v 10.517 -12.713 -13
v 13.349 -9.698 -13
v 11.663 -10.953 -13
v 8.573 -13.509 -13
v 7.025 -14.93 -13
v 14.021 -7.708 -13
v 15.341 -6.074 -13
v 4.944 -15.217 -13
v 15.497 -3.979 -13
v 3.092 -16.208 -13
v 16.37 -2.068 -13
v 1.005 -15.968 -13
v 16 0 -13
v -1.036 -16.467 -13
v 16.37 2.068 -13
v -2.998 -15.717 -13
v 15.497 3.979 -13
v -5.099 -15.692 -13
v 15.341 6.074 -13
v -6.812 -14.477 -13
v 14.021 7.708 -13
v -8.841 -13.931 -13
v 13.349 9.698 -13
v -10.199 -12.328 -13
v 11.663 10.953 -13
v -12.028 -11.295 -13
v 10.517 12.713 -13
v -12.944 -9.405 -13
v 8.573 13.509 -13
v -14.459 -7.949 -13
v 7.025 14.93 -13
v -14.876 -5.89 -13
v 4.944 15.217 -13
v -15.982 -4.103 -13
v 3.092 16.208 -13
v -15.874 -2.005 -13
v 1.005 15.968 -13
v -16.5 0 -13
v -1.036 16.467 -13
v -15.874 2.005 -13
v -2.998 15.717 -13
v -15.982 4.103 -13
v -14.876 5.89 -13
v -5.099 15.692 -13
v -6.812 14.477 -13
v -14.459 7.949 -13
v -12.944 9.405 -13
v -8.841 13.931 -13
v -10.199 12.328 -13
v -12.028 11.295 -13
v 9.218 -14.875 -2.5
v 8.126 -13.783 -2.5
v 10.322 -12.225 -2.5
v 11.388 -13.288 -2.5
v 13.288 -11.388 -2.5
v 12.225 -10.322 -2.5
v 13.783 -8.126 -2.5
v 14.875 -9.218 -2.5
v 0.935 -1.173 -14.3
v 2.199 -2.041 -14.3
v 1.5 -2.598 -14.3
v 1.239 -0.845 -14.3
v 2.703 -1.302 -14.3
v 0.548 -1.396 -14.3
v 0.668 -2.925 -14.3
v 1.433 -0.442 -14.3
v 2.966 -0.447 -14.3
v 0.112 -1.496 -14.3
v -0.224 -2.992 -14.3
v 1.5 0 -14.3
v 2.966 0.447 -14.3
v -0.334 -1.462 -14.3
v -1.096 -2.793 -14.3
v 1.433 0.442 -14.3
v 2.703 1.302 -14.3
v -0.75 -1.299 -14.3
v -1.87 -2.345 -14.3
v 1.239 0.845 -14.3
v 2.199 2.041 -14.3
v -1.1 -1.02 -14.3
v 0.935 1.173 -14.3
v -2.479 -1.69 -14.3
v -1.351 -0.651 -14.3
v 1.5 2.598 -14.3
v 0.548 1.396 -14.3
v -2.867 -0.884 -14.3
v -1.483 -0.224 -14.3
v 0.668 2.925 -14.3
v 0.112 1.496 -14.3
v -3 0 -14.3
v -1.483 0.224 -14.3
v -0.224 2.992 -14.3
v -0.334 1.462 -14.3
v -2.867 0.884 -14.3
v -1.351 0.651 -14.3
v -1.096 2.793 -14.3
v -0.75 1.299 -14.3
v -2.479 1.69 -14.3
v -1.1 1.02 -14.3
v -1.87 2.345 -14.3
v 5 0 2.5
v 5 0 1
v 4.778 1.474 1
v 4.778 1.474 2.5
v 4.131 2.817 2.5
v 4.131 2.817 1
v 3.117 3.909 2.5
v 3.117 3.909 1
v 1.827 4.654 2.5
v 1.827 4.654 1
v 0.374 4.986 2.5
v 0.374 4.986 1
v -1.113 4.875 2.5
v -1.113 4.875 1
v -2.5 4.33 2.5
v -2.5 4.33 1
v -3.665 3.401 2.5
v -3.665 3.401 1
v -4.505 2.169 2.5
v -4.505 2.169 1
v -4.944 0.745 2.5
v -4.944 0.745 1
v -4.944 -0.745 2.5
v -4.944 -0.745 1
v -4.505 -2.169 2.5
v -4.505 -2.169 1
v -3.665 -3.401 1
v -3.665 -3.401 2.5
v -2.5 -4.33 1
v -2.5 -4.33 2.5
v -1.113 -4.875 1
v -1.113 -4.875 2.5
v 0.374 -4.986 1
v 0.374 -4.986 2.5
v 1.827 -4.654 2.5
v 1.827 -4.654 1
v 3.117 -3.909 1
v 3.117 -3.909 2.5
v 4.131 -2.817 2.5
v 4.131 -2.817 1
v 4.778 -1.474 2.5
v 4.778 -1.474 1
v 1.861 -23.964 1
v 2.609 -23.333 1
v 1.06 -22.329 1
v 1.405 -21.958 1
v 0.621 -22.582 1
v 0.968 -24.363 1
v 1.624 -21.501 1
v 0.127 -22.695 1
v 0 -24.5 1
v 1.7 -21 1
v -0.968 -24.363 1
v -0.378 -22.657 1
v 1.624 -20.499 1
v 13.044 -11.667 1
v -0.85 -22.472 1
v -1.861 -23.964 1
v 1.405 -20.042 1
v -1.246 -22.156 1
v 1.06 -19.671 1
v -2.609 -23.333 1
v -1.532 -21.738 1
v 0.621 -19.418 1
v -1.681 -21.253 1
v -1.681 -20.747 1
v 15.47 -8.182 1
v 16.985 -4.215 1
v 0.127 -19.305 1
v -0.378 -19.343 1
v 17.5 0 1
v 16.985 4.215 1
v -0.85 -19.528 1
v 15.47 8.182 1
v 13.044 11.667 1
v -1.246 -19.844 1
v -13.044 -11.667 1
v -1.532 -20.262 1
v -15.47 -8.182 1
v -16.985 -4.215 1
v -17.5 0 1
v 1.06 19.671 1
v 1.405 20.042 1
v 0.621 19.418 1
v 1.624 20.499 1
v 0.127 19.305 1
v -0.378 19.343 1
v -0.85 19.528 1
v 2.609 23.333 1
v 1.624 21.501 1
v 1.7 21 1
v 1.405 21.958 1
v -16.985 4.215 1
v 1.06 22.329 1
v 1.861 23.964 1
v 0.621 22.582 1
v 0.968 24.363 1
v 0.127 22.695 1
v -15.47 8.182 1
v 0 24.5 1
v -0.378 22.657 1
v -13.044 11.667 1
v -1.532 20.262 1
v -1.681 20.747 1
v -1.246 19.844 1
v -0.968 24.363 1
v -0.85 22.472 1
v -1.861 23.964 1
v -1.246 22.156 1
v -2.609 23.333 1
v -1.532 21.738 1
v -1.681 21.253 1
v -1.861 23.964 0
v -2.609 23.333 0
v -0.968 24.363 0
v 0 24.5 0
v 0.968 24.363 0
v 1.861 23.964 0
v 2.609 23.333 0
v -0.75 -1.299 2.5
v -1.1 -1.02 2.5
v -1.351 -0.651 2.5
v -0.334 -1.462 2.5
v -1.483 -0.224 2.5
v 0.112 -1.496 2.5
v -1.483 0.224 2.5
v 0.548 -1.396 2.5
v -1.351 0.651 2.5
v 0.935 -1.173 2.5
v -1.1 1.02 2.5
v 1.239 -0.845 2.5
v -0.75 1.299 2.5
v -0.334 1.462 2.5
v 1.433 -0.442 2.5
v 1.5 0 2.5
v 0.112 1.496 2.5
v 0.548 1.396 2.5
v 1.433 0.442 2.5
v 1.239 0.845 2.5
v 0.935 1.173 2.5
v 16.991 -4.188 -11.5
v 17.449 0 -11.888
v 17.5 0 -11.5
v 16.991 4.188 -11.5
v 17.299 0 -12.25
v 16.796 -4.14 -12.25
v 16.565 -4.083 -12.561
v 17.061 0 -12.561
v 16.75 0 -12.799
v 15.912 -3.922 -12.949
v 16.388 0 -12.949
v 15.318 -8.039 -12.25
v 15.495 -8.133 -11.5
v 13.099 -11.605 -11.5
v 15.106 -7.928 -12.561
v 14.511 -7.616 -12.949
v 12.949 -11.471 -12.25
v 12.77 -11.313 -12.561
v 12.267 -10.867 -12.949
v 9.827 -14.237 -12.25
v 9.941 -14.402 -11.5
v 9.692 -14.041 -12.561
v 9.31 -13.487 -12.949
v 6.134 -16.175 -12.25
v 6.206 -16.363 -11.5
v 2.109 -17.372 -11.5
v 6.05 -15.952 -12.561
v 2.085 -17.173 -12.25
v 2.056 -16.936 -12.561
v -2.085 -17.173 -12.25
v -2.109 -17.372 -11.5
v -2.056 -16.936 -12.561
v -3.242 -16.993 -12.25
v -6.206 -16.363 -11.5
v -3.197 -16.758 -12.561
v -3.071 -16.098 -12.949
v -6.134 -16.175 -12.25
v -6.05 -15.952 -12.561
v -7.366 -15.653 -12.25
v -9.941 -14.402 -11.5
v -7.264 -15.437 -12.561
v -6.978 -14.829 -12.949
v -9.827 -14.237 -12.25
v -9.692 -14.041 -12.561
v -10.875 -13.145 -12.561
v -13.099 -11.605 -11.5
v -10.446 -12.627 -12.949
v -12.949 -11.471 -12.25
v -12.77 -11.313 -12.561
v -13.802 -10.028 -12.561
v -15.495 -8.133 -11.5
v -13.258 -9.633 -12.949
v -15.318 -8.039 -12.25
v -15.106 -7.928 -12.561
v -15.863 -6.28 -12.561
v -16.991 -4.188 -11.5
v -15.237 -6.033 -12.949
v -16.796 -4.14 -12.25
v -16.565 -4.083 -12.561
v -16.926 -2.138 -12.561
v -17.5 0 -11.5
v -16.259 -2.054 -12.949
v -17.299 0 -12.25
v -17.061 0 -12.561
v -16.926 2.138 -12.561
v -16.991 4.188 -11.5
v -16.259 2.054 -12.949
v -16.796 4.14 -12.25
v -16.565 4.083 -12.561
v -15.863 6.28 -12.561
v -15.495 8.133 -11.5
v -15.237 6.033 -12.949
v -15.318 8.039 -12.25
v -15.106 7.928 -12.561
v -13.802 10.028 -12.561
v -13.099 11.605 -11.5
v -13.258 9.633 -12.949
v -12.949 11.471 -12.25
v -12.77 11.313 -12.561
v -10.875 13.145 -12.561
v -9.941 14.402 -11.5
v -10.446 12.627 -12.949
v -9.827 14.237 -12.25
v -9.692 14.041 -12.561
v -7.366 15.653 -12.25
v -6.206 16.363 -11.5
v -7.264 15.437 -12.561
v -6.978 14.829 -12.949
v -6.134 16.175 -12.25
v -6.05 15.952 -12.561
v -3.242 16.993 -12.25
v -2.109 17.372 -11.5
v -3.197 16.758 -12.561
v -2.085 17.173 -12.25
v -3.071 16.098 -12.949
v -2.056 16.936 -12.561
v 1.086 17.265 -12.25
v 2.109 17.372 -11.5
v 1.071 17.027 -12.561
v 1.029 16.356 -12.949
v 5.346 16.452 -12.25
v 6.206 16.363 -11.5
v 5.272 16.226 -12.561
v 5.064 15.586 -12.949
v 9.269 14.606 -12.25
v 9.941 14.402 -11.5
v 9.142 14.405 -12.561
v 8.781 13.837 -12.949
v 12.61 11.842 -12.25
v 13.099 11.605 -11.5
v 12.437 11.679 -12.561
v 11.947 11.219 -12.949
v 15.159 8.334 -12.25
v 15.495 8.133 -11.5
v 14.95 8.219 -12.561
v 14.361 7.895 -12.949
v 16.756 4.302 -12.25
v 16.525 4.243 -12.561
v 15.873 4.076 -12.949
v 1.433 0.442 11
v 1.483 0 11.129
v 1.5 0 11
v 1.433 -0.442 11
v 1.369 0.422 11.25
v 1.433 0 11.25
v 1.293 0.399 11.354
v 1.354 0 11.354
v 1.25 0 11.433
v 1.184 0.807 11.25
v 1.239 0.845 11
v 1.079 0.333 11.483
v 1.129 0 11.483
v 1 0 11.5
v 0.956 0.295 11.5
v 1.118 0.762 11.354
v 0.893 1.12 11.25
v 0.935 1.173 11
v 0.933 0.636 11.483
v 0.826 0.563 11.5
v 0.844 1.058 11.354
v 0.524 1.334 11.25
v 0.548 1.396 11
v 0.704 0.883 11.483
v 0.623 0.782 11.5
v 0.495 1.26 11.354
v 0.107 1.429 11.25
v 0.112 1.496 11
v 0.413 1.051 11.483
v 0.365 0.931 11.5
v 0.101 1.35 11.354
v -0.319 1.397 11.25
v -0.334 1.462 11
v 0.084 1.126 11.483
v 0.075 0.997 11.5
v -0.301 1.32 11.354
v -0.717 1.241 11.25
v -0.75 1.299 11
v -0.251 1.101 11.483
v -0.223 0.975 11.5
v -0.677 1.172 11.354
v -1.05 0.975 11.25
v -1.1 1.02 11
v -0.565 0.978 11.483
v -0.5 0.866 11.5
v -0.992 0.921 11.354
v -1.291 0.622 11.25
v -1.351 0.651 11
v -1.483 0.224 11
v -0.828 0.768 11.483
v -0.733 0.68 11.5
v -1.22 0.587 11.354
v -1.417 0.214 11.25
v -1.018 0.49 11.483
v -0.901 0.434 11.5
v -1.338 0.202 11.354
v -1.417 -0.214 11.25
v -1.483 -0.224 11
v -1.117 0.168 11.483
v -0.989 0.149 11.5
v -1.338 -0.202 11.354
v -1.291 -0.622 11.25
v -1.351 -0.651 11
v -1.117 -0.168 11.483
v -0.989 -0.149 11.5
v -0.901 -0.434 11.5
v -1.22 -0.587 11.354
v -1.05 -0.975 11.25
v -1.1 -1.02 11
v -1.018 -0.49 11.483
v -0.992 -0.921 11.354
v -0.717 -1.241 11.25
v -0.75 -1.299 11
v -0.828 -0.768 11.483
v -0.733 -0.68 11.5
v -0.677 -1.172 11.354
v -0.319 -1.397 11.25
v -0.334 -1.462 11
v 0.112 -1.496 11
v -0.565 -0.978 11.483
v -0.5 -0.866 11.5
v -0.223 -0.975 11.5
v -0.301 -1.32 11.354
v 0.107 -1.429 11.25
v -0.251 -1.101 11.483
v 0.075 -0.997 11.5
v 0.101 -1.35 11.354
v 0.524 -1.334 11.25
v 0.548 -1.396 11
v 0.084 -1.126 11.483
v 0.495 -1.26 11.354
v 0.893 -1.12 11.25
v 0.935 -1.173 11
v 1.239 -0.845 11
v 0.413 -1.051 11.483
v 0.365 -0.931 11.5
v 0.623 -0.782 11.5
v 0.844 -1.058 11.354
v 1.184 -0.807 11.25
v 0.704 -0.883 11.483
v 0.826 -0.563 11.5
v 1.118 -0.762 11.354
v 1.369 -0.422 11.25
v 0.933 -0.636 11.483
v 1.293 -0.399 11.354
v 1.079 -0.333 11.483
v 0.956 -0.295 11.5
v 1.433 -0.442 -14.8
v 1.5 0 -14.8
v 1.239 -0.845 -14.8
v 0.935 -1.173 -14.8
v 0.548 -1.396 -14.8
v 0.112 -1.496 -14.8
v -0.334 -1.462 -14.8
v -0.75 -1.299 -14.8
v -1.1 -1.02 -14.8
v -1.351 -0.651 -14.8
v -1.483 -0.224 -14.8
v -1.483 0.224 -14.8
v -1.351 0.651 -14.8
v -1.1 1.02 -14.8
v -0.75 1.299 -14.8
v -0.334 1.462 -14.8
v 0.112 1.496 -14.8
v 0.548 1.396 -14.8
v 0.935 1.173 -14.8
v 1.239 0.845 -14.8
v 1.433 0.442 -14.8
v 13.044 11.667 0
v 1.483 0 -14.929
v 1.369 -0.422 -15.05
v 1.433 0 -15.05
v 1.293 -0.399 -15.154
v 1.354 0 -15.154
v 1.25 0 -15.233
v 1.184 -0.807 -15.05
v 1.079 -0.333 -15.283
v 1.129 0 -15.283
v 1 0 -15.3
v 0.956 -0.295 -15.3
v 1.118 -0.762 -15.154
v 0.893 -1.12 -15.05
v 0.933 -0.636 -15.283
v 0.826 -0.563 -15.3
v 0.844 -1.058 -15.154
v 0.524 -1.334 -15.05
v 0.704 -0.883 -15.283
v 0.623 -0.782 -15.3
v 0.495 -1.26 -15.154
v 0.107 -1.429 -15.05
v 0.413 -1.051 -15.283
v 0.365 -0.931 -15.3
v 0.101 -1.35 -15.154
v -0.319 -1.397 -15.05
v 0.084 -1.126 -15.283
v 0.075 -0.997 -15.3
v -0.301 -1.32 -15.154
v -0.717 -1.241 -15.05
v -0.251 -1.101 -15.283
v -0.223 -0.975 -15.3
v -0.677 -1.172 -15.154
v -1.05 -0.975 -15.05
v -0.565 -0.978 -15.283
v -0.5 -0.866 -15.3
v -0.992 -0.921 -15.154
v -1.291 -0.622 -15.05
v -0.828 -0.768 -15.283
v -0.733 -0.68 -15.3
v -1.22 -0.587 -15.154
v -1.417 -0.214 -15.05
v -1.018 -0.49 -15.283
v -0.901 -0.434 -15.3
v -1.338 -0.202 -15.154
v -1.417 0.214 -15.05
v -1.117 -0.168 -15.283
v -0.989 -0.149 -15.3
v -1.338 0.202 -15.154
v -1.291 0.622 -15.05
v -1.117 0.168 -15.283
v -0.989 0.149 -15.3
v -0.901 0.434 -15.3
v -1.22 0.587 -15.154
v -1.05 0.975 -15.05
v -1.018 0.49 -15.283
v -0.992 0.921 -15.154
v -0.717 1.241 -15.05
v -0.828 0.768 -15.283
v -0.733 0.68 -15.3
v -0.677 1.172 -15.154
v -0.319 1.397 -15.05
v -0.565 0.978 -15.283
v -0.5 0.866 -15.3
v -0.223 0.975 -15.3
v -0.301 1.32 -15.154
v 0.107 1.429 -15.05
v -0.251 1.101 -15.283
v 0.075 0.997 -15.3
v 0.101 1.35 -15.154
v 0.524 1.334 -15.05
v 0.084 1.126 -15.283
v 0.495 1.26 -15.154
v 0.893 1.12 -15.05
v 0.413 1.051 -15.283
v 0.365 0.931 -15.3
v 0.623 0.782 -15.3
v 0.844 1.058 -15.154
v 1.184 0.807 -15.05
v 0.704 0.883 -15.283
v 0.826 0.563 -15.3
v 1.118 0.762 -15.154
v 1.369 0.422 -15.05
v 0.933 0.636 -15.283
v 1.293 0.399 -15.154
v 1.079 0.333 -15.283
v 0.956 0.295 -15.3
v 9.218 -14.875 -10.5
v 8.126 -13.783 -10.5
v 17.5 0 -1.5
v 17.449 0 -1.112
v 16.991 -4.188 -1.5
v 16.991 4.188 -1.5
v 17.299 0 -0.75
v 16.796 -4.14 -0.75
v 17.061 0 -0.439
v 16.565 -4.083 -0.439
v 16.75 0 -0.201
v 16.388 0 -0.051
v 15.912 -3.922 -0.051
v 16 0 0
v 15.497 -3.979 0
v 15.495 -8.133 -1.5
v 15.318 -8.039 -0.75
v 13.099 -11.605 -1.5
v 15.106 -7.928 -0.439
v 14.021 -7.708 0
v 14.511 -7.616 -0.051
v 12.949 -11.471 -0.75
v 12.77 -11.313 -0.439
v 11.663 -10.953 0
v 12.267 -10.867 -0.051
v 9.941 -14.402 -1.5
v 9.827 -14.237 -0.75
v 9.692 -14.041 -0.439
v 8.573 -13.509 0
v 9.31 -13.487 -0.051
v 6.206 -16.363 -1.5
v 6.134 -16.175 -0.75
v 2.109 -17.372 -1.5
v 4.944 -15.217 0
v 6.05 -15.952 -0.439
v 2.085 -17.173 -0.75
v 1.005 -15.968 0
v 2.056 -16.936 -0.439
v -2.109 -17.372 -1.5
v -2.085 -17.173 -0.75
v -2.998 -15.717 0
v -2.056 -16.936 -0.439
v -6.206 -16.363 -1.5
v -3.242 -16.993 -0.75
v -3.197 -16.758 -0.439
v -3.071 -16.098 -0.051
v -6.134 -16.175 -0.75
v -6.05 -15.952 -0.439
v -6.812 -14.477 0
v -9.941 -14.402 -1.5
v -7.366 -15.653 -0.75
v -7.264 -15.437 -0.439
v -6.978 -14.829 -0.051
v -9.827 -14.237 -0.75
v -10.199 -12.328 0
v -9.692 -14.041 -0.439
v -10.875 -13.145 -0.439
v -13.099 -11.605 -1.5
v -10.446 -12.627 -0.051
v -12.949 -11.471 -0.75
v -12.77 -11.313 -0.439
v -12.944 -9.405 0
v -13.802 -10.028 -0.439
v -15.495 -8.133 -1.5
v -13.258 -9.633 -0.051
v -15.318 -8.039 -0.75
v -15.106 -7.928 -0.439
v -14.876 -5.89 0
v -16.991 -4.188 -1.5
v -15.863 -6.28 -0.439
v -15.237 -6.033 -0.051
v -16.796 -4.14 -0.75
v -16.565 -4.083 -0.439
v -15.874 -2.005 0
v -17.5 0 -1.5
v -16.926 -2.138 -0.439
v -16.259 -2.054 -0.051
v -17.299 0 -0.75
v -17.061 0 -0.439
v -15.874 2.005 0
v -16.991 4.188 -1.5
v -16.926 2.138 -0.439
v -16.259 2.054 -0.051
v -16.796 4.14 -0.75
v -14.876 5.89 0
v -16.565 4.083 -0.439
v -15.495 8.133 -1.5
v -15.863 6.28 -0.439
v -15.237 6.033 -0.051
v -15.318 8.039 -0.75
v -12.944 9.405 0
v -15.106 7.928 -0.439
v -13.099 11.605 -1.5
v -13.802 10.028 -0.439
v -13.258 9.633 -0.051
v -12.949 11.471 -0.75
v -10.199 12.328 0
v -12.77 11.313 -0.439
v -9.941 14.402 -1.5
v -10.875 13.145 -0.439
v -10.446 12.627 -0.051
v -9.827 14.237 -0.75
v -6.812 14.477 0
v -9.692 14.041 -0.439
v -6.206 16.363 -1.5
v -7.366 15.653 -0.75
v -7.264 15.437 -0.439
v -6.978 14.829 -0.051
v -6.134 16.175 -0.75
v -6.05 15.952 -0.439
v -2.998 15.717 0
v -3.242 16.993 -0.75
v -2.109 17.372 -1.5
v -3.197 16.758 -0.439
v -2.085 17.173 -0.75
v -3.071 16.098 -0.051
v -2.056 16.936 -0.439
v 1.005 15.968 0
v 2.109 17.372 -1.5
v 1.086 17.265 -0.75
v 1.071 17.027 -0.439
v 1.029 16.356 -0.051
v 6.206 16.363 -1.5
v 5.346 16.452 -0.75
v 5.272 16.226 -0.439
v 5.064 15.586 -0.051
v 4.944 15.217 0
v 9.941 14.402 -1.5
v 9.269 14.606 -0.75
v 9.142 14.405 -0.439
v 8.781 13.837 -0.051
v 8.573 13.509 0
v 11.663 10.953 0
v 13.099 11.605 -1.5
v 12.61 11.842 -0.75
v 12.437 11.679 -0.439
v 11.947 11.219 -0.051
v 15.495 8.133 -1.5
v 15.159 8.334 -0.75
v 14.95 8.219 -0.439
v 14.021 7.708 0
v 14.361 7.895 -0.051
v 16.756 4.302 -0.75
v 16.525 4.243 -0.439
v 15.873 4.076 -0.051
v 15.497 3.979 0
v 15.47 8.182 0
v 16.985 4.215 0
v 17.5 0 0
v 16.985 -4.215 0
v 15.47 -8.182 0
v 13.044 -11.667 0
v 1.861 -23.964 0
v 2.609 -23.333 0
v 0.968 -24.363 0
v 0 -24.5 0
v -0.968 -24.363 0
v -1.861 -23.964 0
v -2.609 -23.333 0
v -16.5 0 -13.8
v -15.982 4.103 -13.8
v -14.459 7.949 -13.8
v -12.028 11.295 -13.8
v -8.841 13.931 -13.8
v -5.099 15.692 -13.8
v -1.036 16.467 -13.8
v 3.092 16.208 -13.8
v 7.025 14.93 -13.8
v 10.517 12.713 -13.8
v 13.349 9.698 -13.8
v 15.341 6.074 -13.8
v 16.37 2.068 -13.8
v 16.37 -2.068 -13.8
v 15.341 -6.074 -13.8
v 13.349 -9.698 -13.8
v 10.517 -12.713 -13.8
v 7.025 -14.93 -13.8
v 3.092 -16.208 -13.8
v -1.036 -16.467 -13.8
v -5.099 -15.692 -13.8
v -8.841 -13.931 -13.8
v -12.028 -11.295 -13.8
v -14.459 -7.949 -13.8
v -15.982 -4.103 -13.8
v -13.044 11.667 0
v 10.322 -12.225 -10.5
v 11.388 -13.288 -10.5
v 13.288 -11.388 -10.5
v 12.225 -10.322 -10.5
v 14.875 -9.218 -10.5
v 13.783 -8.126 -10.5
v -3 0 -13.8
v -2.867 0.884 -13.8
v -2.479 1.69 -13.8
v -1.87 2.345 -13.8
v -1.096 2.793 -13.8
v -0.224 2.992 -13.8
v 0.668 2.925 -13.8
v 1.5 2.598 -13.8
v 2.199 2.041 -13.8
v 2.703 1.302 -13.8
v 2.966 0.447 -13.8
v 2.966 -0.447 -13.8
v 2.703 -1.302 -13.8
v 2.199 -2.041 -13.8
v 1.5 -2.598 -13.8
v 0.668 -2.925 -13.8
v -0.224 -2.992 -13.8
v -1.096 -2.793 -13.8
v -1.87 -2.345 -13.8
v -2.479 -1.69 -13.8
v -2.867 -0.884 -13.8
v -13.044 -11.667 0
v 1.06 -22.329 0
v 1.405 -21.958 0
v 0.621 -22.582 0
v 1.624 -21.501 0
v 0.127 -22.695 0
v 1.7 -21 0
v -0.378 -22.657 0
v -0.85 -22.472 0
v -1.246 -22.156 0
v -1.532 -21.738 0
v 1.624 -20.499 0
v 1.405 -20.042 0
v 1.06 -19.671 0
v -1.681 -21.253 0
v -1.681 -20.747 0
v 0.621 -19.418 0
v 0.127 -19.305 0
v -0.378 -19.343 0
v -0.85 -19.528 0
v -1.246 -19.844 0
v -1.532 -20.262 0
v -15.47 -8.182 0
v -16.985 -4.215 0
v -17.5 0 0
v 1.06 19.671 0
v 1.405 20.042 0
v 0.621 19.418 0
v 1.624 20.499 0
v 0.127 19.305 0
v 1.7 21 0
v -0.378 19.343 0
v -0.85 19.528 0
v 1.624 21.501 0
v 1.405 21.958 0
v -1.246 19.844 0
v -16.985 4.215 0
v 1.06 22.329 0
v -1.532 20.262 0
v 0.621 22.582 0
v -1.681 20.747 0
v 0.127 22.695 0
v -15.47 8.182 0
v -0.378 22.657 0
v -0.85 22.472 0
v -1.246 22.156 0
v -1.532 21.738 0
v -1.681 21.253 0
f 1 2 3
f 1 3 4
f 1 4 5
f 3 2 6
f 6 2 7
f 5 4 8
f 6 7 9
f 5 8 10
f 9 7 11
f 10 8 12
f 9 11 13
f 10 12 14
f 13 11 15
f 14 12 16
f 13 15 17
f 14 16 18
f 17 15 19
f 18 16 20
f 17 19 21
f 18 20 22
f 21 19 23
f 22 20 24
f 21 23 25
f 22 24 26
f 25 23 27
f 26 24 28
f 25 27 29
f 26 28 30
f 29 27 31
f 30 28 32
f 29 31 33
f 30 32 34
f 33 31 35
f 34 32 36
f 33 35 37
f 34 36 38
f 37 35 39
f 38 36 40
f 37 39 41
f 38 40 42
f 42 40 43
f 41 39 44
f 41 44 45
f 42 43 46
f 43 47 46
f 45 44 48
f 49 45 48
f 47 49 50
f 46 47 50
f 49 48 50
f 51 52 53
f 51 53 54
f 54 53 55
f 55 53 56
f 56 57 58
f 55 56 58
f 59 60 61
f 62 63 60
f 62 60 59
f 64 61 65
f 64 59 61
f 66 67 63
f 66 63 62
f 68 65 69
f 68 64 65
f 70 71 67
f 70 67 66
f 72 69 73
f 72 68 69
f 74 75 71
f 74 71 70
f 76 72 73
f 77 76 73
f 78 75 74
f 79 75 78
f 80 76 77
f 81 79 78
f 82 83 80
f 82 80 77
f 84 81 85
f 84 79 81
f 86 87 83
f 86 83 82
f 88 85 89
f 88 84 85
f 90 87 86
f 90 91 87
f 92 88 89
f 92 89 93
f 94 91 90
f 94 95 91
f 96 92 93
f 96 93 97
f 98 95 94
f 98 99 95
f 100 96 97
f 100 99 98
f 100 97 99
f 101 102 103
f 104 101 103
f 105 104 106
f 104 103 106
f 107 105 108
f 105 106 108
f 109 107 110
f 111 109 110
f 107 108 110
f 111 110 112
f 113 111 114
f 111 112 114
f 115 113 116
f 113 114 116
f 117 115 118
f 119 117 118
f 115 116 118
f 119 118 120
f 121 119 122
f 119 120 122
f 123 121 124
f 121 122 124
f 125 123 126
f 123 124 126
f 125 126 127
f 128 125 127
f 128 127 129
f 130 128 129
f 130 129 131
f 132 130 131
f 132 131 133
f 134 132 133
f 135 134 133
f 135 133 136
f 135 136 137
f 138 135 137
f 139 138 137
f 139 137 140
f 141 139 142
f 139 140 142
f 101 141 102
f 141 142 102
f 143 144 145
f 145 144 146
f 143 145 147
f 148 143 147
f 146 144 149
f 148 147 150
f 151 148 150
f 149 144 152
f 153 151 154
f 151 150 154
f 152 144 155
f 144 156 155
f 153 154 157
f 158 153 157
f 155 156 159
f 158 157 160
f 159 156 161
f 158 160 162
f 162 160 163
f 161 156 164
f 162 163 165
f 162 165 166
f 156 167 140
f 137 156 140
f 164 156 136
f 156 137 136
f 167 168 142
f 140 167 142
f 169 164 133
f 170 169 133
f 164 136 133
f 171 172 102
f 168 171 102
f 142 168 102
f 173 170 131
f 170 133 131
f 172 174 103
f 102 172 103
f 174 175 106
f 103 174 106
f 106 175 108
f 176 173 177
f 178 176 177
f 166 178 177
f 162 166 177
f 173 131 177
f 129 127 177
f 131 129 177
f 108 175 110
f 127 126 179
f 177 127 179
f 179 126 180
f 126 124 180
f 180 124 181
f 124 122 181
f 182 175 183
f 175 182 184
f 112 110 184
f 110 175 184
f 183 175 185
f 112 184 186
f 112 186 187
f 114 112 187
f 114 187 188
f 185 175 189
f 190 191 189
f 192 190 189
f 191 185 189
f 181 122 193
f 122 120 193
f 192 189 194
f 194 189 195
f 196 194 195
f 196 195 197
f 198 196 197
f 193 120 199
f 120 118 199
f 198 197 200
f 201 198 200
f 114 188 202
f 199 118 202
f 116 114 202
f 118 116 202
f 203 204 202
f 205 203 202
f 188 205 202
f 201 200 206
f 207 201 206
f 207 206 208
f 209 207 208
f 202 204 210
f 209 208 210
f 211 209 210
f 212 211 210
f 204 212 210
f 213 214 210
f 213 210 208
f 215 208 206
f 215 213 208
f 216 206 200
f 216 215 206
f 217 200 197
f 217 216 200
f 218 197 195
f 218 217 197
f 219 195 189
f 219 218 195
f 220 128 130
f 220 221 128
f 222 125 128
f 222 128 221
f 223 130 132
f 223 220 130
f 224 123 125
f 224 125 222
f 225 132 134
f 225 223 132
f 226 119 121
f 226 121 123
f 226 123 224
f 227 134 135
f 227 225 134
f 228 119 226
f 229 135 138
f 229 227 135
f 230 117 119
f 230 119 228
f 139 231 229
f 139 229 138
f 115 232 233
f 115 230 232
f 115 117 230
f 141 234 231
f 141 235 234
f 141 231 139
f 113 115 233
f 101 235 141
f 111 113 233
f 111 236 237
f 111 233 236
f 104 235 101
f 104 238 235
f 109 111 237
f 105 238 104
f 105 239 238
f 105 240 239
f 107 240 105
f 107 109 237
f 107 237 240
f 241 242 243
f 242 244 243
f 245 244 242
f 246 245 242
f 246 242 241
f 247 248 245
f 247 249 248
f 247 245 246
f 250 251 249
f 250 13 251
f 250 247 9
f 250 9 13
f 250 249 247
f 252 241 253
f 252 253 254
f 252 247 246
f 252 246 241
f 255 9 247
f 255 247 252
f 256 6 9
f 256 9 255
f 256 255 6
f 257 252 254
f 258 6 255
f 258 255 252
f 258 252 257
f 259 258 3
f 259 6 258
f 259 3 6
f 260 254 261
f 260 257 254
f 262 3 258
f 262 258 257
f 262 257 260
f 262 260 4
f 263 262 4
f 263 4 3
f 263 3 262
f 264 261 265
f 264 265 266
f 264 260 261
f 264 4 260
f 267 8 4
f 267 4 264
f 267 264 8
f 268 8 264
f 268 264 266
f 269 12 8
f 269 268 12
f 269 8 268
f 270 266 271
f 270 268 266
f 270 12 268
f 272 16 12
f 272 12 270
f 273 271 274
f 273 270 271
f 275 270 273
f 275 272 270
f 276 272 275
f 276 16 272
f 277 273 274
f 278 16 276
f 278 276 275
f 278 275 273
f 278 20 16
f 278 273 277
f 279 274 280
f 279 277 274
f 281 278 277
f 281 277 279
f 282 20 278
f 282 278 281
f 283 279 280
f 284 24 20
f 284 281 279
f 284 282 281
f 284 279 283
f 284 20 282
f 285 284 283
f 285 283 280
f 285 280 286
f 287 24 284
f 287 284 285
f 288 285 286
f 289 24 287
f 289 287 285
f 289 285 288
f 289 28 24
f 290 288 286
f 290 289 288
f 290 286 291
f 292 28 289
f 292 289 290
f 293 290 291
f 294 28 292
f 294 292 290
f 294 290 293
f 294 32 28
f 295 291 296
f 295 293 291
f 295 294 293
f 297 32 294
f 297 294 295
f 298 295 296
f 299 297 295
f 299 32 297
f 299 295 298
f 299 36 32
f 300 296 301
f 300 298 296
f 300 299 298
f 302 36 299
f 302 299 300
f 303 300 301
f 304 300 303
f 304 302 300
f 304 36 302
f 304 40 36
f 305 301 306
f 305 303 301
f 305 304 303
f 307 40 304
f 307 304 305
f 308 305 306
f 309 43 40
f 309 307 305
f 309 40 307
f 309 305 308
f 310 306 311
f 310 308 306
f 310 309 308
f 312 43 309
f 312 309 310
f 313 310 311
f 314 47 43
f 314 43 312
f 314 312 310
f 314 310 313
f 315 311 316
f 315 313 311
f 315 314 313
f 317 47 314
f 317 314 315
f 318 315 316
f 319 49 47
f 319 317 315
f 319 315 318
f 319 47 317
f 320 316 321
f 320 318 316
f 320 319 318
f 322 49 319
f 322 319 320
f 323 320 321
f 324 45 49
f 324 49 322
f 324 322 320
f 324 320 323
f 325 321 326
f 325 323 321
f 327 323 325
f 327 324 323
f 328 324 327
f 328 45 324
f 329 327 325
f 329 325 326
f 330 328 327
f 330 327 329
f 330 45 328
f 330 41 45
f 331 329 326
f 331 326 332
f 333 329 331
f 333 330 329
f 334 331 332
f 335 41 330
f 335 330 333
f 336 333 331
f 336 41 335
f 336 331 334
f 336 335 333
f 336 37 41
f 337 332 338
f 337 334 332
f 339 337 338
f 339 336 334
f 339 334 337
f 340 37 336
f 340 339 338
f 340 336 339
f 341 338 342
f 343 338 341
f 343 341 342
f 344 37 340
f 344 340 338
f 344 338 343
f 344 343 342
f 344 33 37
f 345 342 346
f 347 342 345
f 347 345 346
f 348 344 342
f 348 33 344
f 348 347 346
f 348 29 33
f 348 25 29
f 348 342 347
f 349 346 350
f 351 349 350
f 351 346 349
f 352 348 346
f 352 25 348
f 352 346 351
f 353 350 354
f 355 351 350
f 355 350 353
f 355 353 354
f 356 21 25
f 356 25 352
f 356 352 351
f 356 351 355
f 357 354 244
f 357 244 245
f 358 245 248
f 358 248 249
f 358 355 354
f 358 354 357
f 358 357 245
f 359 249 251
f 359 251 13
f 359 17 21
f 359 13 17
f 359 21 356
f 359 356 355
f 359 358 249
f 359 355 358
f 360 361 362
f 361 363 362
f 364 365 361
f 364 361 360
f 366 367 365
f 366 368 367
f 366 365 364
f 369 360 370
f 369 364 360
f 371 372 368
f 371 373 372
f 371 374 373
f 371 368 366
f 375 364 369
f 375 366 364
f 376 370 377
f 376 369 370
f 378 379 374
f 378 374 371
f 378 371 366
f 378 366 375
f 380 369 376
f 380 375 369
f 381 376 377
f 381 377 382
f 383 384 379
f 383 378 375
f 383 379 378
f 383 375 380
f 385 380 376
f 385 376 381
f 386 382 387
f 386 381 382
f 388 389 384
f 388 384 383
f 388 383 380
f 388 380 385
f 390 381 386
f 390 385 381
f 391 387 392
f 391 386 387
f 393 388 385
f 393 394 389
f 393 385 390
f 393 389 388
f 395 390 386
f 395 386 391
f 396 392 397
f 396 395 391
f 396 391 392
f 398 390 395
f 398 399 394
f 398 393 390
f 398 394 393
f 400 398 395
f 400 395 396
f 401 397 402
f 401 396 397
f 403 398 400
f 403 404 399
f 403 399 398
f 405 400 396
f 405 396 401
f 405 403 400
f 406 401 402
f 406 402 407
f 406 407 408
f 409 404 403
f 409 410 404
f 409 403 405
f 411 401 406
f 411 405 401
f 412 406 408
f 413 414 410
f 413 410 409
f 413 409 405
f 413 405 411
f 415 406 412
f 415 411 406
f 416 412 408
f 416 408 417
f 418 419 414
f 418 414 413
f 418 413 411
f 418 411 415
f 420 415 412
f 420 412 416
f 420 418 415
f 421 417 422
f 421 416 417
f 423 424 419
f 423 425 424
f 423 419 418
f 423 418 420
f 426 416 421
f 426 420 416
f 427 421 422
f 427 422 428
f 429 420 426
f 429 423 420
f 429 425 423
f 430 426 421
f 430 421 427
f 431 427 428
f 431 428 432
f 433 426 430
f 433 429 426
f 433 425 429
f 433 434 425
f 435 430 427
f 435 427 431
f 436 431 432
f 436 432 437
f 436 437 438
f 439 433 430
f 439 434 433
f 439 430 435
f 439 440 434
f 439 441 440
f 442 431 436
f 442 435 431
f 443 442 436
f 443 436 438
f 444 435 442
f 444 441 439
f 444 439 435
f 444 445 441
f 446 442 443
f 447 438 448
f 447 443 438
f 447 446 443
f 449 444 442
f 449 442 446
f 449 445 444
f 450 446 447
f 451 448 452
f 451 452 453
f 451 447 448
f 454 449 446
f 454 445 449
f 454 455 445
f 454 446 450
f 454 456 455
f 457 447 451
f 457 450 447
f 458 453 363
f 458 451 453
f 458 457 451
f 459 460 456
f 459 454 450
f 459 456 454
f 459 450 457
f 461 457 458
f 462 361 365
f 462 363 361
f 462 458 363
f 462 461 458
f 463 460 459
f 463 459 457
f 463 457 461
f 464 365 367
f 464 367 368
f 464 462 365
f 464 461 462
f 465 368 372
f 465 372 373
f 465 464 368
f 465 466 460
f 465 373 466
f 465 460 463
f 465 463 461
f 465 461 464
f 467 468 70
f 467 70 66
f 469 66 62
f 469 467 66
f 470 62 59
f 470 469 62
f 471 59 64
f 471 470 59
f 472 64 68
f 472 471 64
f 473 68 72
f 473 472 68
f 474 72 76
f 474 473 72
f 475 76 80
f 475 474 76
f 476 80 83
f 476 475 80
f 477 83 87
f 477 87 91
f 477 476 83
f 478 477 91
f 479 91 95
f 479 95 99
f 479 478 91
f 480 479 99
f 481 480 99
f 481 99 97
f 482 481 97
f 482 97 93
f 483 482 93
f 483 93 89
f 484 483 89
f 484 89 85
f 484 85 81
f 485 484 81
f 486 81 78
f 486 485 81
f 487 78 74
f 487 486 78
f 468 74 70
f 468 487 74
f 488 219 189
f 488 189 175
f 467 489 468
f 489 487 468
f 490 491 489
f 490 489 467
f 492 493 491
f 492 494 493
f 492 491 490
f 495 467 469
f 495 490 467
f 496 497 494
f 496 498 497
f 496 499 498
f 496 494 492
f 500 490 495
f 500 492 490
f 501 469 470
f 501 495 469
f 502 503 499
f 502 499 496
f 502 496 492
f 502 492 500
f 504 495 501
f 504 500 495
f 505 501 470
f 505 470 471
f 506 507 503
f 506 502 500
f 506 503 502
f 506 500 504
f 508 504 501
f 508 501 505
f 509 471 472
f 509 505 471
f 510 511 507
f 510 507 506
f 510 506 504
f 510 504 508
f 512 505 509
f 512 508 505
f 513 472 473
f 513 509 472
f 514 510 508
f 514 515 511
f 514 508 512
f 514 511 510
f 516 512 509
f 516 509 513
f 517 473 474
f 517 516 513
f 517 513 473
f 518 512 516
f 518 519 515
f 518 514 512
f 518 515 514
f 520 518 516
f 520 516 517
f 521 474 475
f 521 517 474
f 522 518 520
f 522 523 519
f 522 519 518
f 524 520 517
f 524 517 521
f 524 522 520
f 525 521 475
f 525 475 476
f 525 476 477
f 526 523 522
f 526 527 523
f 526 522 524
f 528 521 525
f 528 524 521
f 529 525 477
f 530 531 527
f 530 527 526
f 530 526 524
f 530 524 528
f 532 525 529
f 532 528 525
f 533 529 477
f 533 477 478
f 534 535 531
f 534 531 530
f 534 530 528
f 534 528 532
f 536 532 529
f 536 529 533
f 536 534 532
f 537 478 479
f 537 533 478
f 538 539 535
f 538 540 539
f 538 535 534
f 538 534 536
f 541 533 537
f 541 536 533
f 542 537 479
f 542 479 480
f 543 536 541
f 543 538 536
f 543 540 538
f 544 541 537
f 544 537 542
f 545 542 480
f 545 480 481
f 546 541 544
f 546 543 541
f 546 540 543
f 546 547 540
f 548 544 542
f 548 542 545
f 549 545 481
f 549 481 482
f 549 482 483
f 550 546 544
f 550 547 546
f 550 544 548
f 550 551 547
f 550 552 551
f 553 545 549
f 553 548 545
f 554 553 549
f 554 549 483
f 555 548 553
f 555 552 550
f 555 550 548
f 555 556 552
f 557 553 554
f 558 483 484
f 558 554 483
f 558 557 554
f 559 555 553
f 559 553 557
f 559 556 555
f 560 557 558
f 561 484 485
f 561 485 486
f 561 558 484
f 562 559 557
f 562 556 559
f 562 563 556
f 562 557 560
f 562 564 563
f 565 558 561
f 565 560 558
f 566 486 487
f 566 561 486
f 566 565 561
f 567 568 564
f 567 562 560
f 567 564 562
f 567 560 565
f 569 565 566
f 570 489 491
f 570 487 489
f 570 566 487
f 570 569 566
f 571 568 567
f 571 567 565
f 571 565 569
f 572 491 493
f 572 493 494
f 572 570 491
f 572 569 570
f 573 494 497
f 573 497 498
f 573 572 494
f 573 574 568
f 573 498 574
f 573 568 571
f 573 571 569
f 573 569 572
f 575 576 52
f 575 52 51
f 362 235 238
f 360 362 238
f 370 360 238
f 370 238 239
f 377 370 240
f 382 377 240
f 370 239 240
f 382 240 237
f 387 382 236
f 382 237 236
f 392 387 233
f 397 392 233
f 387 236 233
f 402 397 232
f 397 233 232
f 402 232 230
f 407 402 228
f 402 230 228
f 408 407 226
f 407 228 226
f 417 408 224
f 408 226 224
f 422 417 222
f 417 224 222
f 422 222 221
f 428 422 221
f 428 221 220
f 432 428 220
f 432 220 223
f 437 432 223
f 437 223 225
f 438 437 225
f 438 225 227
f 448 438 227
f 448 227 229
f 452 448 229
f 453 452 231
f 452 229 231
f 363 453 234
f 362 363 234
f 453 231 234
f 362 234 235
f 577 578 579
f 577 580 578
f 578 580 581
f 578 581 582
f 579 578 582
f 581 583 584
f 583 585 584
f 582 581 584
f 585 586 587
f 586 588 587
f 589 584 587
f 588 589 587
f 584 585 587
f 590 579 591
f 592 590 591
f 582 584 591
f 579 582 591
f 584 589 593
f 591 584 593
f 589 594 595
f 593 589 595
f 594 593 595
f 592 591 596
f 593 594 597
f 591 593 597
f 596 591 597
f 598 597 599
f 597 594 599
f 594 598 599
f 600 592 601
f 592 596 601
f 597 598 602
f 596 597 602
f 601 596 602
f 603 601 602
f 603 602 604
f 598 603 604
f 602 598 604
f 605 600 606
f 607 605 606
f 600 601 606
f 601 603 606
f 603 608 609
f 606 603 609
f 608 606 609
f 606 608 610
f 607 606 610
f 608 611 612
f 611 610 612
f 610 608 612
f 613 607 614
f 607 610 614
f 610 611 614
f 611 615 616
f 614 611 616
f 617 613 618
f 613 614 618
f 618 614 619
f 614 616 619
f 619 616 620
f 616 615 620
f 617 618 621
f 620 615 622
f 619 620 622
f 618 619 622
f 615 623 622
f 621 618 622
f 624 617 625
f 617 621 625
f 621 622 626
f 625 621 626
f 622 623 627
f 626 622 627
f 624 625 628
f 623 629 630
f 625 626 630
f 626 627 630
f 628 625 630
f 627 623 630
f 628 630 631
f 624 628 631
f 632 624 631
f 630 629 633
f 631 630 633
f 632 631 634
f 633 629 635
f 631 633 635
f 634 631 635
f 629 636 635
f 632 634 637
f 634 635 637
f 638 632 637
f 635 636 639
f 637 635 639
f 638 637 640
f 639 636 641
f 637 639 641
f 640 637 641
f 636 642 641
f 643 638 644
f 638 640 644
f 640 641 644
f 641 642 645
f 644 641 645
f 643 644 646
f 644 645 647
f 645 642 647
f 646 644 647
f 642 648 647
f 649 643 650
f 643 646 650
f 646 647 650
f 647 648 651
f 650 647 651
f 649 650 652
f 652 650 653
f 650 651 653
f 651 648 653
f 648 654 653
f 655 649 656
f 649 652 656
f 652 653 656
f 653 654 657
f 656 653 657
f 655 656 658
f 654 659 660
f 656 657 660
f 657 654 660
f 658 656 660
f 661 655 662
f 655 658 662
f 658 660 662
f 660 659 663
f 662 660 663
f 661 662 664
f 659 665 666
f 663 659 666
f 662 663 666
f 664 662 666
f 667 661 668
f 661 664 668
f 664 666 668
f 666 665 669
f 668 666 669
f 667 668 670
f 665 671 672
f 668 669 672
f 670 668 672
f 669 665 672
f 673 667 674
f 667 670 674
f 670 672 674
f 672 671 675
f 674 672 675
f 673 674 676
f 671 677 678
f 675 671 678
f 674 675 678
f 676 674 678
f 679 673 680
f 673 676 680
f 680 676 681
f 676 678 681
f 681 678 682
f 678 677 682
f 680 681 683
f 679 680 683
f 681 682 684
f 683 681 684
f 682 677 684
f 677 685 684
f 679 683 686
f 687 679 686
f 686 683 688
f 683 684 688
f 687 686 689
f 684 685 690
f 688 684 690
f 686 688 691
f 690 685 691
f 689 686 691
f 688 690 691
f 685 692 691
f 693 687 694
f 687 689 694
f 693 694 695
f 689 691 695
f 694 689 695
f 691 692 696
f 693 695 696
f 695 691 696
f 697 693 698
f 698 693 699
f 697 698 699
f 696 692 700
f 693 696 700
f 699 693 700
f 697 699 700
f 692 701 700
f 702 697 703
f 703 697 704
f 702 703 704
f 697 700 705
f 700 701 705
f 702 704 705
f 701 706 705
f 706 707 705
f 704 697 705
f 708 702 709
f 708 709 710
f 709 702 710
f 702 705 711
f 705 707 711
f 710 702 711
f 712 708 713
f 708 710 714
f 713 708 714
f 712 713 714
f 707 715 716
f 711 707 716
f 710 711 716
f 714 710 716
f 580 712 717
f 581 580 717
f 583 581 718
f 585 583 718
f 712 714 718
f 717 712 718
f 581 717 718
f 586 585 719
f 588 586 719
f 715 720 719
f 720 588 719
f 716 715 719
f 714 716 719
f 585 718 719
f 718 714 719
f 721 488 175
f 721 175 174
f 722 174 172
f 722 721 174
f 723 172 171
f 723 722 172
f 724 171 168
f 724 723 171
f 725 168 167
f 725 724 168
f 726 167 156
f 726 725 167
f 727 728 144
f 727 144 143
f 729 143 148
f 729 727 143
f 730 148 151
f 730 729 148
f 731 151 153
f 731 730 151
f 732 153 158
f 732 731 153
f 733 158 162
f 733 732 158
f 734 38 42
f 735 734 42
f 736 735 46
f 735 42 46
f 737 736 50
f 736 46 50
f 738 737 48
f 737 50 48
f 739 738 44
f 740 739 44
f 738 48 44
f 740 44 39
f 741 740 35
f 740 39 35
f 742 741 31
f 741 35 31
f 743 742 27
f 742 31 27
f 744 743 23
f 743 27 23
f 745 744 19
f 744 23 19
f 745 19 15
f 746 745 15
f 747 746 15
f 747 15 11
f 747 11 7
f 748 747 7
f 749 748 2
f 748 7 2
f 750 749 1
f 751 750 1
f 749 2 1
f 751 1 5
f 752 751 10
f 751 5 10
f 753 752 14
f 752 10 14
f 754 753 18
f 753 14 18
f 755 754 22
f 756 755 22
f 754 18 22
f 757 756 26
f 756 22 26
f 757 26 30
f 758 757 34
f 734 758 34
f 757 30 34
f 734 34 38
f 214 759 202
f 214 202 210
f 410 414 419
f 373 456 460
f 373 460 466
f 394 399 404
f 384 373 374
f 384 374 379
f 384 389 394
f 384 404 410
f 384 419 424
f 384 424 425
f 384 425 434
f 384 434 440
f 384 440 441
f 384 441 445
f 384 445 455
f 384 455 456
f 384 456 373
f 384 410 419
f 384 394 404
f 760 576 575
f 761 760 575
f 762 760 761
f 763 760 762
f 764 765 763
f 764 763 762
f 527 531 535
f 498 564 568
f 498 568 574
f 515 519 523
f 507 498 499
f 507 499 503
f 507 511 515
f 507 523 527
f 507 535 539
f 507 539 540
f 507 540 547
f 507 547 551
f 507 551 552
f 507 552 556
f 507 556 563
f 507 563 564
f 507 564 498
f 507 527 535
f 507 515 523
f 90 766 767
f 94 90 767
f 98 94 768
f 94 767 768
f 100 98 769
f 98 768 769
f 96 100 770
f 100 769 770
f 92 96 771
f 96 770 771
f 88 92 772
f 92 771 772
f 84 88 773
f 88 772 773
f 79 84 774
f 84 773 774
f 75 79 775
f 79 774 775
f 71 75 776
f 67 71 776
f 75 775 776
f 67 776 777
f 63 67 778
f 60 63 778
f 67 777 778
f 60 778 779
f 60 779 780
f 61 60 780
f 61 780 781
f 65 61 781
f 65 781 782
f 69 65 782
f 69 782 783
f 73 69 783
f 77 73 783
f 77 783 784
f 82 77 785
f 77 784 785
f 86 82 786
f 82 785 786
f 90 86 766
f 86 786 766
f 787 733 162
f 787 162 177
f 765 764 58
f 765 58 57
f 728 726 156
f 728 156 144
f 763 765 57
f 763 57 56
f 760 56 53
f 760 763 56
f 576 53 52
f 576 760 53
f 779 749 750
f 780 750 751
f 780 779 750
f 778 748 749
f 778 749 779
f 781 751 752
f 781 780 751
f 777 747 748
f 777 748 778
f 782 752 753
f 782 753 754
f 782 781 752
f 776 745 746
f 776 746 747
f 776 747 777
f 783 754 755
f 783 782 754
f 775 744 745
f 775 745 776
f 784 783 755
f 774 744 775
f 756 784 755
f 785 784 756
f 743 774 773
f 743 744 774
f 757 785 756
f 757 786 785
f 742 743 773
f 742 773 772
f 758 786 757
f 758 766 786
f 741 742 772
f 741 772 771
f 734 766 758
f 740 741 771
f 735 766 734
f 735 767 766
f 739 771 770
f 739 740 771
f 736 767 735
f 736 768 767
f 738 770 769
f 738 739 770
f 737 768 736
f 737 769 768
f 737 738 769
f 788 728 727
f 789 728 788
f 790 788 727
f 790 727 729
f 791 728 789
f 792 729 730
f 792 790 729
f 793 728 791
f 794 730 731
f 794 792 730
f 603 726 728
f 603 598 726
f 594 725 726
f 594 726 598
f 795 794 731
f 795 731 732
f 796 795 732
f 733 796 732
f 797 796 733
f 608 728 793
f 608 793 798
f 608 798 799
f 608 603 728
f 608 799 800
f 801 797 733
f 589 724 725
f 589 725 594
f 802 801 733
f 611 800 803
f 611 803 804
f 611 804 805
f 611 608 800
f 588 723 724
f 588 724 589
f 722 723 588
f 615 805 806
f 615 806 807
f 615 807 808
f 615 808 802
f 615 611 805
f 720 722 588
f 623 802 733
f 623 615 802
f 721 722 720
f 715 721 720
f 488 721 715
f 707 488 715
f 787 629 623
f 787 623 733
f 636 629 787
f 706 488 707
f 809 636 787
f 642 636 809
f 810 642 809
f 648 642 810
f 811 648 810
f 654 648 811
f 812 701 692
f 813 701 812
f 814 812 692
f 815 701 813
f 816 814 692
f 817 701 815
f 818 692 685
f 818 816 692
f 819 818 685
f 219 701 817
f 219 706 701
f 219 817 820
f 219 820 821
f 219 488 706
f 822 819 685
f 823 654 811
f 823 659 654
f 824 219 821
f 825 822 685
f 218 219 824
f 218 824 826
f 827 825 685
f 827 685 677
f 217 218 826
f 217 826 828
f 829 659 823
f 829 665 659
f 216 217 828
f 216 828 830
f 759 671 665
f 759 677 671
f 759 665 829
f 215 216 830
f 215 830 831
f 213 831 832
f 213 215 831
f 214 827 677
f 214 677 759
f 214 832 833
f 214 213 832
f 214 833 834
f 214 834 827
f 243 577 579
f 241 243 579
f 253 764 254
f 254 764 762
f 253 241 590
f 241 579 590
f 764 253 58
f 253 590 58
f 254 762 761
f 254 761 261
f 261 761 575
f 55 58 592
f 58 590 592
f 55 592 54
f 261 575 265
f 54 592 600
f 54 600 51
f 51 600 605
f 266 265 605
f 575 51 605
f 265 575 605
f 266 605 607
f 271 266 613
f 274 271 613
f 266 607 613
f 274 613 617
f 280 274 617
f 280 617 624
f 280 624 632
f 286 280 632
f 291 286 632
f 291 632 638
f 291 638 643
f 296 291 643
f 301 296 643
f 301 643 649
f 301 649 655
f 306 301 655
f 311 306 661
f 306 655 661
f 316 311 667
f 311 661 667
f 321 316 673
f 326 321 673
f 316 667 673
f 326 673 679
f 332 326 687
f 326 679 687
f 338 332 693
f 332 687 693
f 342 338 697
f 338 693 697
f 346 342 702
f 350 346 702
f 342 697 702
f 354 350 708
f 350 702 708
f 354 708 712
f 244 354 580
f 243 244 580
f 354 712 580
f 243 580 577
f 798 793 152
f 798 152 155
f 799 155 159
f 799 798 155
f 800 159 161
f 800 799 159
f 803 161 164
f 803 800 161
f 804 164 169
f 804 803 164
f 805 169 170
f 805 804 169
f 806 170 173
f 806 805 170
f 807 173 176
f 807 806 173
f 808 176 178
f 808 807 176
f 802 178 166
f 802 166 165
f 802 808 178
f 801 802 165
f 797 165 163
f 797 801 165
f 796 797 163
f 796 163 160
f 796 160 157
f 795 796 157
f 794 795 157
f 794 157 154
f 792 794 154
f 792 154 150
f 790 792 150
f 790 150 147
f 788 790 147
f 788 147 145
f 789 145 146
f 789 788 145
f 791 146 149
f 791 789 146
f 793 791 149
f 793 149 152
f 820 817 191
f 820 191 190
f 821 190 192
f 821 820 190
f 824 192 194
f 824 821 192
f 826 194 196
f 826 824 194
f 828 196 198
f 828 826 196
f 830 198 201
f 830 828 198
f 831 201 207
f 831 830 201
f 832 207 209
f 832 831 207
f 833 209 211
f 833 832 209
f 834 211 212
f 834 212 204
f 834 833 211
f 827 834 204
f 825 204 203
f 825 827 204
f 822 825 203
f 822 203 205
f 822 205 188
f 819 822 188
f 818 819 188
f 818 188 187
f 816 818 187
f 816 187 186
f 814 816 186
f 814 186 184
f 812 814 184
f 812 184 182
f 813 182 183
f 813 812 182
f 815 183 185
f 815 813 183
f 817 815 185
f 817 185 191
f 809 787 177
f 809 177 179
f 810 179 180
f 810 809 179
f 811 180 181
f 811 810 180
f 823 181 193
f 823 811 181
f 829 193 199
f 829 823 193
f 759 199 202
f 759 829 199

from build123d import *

# Parameters (mm, degrees)
SKETCH1_R           = 1.7
BOSS_EXTRUDE1_DEPTH = 1
SKETCH2_R           = 17.5
BOSS_EXTRUDE2_DEPTH = 13
FILLET4_R           = 1.5
SKETCH3_R           = 16.5
BOSS_EXTRUDE3_DEPTH = 0.8
SKETCH4_R           = 5
BOSS_EXTRUDE4_DEPTH = 1.5
SKETCH6_R           = 1.5
BOSS_EXTRUDE5_DEPTH = 9
FILLET2_R           = 0.5
SKETCH8_R           = 3
BOSS_EXTRUDE6_DEPTH = 0.5
BOSS_EXTRUDE7_START = 1
SKETCH9_R           = 1.5
BOSS_EXTRUDE7_DEPTH = 1
FILLET3_R           = 0.5
SURFACECUT1_START   = -10.5
SURFACECUT1_DEPTH   = 8


# Read off the part's stored shape, not the designer's step: SurfaceCut1
with BuildPart() as part:
    # Sketch1 → Boss-Extrude1 (new body)
    with BuildSketch(Plane.XY):
        with BuildLine():
            Line((-13.043729869, 11.666666667), (-2.608745974, 23.333333333))
            ThreePointArc((-2.608745974, 23.333333333), (0, 24.5), (2.608745974, 23.333333333))
            Line((2.608745974, 23.333333333), (13.043729869, 11.666666667))
            ThreePointArc((13.043729869, 11.666666667), (17.5, 0), (13.043729869, -11.666666667))
            Line((13.043729869, -11.666666667), (2.608745974, -23.333333333))
            ThreePointArc((2.608745974, -23.333333333), (0, -24.5), (-2.608745974, -23.333333333))
            Line((-2.608745974, -23.333333333), (-13.043729869, -11.666666667))
            ThreePointArc((-13.043729869, -11.666666667), (-17.5, 0), (-13.043729869, 11.666666667))
        make_face()
        with Locations((0, 21)):
            Circle(SKETCH1_R, mode=Mode.SUBTRACT)
        with Locations((0, -21)):
            Circle(SKETCH1_R, mode=Mode.SUBTRACT)
    extrude(amount=BOSS_EXTRUDE1_DEPTH)


with BuildPart() as body_2:
    # Sketch2 → Boss-Extrude2 (new body)
    with BuildSketch(Plane(origin=(0, 0, 0), x_dir=(-1, 0, 0), z_dir=(0, 0, -1))):
        with Locations(Location((0, 0, 0), (0, 0, 180))):
            Circle(SKETCH2_R)
    extrude(amount=BOSS_EXTRUDE2_DEPTH)

    # Fillet4
    fillet4_edges = [body_2.edges().sort_by_distance(p)[0] for p in [
        (-17.5, 0, 0),
        (-17.5, 0, -13),
    ]]
    fillet(fillet4_edges, radius=FILLET4_R)


with BuildPart() as part_1:
    add(part.part)

    # Combine1: union body 2
    add(body_2.part)

    # Sketch3 → Boss-Extrude3 (add)
    with BuildSketch(Plane(origin=(0, 0, -13), x_dir=(-1, 0, 0), z_dir=(0, 0, -1))):
        Circle(SKETCH3_R)
    extrude(amount=BOSS_EXTRUDE3_DEPTH)

    # Sketch4 → Boss-Extrude4 (add)
    with BuildSketch(Plane.XY.offset(1)):
        Circle(SKETCH4_R)
    extrude(amount=BOSS_EXTRUDE4_DEPTH)

    # Sketch6 → Boss-Extrude5 (add)
    with BuildSketch(Plane.XY.offset(2.5)):
        Circle(SKETCH6_R)
    extrude(amount=BOSS_EXTRUDE5_DEPTH)

    # Fillet2
    fillet2_edges = [part_1.edges().sort_by_distance(p)[0] for p in [
        (-1.5, 0, 11.5),
    ]]
    fillet(fillet2_edges, radius=FILLET2_R)

    # Sketch8 → Boss-Extrude6 (add)
    with BuildSketch(Plane(origin=(0, 0, -13.8), x_dir=(-1, 0, 0), z_dir=(0, 0, -1))):
        Circle(SKETCH8_R)
    extrude(amount=BOSS_EXTRUDE6_DEPTH)

    # Sketch9 → Boss-Extrude7 (add)
    with BuildSketch(Plane(origin=(0, 0, -14.3), x_dir=(-1, 0, 0), z_dir=(0, 0, -1)).offset(BOSS_EXTRUDE7_START)):
        with Locations(Location((0, 0, 0), (0, 0, 180))):
            Circle(SKETCH9_R)
    extrude(amount=-BOSS_EXTRUDE7_DEPTH)

    # Fillet3
    fillet3_edges = [part_1.edges().sort_by_distance(p)[0] for p in [
        (-1.5, 0, -15.3),
    ]]
    fillet(fillet3_edges, radius=FILLET3_R)

    # SurfaceCut1 outline → SurfaceCut1 (cut)
    with BuildSketch(Plane.XY.offset(SURFACECUT1_START)):
        with BuildLine():
            Line((8.126024025, -13.782878275), (9.218356678, -14.875210928))
            ThreePointArc((9.218356678, -14.875210928), (12.374368671, -12.374368671), (14.875210928, -9.218356678))
            Line((14.875210928, -9.218356678), (13.782878275, -8.126024025))
            ThreePointArc((13.782878275, -8.126024025), (11.313708499, -11.313708499), (8.126024025, -13.782878275))
        make_face()
    extrude(amount=SURFACECUT1_DEPTH, mode=Mode.SUBTRACT)


solid = part_1.part
